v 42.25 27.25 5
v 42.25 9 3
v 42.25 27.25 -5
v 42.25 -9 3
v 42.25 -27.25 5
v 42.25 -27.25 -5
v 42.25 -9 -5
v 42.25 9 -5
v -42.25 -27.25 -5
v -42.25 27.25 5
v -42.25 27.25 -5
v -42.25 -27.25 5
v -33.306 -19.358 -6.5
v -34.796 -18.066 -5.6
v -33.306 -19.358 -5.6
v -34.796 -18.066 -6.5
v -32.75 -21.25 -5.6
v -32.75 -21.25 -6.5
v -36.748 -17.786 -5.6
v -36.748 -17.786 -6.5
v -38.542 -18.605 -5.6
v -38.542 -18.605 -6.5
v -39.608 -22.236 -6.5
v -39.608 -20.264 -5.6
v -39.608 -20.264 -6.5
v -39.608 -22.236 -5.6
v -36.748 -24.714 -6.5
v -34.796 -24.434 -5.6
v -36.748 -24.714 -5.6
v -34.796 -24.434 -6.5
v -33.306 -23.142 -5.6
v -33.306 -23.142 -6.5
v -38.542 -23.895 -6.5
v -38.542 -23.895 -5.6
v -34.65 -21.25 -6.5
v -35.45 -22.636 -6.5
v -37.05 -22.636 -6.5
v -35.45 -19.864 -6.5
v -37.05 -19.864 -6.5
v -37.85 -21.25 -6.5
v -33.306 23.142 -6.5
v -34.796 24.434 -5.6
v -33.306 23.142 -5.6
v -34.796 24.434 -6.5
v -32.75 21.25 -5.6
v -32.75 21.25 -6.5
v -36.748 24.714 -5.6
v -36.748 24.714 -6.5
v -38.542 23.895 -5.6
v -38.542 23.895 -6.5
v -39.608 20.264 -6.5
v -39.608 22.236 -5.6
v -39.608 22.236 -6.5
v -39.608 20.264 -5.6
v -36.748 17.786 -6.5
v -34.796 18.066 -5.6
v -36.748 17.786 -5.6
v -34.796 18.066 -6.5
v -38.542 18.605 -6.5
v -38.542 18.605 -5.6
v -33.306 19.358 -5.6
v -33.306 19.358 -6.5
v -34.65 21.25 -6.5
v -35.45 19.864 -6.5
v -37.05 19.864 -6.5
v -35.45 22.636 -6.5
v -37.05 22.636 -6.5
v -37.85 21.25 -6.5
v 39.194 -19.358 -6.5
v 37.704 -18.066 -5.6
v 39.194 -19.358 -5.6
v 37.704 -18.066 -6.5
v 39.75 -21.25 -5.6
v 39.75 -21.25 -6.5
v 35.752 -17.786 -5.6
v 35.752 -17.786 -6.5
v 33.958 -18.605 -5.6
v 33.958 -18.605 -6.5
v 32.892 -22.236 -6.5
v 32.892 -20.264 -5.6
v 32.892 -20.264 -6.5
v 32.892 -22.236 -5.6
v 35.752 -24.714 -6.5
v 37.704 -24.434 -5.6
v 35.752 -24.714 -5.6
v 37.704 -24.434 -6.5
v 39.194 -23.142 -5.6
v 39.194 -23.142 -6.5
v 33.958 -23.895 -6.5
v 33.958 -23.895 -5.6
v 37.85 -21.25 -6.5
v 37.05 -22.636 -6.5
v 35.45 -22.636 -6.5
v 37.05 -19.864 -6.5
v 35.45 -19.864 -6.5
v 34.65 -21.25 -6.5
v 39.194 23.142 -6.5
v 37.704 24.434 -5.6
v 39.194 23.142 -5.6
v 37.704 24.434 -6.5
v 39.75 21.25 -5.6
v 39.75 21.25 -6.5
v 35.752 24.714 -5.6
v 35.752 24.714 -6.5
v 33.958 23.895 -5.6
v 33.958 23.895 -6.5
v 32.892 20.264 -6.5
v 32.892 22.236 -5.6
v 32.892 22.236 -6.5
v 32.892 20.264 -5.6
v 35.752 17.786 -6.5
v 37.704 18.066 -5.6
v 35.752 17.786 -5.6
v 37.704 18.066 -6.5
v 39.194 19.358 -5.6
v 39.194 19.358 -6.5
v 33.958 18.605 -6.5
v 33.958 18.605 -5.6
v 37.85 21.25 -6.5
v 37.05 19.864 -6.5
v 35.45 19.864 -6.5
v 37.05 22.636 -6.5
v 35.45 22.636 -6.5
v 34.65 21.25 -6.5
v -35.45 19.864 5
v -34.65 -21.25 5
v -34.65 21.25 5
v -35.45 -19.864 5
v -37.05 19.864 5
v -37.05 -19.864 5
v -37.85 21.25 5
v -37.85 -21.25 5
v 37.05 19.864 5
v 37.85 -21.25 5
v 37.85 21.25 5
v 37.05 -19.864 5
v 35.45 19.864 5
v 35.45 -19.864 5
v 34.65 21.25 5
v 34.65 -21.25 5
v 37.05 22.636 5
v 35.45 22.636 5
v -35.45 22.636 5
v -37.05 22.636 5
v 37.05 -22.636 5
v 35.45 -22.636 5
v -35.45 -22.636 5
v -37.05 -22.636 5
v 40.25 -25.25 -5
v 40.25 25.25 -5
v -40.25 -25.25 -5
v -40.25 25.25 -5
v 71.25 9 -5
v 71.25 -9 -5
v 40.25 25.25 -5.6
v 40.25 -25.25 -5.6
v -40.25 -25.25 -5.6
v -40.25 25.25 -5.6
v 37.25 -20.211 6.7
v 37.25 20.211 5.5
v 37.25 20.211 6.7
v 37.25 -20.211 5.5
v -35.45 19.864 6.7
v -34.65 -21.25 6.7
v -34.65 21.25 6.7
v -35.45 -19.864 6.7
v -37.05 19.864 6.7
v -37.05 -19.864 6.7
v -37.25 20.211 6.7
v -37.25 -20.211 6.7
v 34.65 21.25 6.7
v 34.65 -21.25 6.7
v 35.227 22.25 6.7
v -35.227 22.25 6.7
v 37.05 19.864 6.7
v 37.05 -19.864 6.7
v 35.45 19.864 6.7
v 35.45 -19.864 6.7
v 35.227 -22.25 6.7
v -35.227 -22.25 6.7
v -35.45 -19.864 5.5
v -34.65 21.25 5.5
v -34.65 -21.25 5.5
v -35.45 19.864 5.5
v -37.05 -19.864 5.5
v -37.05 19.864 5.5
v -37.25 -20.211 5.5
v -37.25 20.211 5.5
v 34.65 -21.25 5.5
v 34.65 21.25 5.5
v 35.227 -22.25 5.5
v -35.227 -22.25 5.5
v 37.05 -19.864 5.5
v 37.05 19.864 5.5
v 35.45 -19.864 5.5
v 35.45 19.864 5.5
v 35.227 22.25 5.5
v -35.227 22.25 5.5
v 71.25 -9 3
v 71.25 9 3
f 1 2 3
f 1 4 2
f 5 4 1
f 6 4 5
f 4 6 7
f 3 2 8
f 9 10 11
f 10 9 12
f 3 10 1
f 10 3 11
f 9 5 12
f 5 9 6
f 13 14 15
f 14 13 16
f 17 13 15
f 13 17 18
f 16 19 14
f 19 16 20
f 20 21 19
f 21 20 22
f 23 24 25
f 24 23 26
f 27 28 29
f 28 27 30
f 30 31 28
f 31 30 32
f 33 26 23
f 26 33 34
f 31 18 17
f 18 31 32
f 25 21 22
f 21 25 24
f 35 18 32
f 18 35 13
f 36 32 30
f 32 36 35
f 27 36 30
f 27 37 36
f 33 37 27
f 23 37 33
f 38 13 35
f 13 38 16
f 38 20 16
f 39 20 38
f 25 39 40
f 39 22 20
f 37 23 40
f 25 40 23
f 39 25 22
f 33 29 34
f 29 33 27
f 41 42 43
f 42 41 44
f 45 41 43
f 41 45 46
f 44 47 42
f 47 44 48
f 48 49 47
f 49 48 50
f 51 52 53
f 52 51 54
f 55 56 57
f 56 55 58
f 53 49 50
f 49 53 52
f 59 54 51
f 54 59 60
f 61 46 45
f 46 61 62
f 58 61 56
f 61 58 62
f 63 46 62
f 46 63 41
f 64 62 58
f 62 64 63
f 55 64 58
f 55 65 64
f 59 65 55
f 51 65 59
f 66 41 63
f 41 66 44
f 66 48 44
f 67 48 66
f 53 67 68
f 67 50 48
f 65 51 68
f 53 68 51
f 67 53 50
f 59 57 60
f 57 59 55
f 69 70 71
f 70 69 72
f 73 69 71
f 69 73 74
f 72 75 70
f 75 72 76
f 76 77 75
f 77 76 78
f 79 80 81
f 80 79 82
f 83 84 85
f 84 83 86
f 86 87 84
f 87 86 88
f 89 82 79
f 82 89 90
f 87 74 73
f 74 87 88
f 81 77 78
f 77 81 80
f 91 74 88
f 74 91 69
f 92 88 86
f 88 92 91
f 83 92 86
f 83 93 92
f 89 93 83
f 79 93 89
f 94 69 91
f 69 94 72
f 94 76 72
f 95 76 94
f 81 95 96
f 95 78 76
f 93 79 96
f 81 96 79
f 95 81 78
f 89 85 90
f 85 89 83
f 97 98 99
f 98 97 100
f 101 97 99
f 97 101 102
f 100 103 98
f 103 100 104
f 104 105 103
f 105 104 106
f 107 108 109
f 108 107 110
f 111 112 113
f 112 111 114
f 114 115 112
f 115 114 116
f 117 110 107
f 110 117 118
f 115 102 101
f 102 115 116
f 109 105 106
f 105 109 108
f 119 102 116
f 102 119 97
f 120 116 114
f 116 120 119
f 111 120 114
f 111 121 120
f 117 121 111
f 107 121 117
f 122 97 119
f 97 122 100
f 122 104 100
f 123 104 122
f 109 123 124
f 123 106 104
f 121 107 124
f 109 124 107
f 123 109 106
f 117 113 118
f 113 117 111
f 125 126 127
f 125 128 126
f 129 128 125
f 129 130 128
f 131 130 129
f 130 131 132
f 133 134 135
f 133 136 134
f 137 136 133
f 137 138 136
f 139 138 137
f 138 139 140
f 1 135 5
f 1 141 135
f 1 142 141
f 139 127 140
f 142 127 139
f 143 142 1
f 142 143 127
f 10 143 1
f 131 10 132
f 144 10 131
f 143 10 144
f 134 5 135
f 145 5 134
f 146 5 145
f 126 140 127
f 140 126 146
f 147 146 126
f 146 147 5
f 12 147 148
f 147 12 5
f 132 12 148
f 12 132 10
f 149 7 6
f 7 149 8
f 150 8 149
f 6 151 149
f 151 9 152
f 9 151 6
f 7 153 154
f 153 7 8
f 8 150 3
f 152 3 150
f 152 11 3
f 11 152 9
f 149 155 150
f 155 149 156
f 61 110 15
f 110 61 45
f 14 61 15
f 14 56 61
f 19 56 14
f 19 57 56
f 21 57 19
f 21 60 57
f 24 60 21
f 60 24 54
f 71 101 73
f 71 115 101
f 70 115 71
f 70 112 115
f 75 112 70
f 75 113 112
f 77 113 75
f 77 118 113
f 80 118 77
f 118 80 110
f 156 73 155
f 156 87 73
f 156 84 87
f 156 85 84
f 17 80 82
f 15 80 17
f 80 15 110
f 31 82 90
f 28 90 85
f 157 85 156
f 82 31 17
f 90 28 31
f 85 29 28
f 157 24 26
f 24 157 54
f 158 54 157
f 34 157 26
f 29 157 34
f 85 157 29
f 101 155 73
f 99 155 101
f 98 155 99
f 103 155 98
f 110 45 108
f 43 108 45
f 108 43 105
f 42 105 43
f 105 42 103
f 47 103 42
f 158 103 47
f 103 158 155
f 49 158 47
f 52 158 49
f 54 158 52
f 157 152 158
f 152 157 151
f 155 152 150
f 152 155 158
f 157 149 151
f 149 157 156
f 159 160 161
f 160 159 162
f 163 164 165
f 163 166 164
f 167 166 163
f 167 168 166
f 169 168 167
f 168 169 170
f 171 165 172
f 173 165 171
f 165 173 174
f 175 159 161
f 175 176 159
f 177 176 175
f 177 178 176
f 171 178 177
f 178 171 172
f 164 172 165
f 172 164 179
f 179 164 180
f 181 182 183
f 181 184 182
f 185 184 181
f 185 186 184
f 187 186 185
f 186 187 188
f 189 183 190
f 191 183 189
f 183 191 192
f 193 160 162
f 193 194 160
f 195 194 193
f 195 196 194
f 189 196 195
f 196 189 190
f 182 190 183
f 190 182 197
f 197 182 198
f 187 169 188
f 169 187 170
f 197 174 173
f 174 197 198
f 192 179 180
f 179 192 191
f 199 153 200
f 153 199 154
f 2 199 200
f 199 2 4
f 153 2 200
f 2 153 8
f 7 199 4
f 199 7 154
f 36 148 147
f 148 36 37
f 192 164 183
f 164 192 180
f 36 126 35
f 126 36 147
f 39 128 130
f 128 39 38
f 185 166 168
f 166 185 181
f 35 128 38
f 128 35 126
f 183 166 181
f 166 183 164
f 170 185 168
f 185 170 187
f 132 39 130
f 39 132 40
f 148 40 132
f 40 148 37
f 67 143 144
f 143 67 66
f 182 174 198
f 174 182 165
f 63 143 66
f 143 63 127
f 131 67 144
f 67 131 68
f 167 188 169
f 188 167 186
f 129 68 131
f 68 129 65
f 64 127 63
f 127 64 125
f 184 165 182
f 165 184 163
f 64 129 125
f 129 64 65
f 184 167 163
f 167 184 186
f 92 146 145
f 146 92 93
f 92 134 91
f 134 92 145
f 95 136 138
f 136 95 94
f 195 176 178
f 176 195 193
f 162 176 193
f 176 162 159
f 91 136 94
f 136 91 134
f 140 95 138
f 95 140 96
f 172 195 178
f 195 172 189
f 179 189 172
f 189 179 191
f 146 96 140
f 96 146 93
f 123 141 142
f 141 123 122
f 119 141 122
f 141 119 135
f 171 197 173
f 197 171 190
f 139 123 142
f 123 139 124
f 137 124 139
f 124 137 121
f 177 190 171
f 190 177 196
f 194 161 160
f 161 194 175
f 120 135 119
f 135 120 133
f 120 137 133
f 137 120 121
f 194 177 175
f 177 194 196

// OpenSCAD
// Parameters
width_mm = 84.5; //[42.25:169:0.1]
height_mm = 54.5; //[27.25:109:0.1]
thickness_mm = 10; //[5:20:0.1]
bezel_thickness_mm = 2.5; //[1:6:0.1]
bezel_frame_mm = 4; //[2:10:0.1]
aperture_width_mm = 76.5; //[38.25:153:0.1]
aperture_height_mm = 46.5; //[23.25:93:0.1]
aperture_offset_x_mm = 0; //[-10:10:0.1]
aperture_offset_y_mm = 0; //[-10:10:0.1]
pcb_thickness_mm = 1.6; //[0.8:3.2:0.1]
pcb_margin_mm = 2; //[0:6:0.1]
mount_hole_diameter_mm = 3.2; //[2:6.5:0.1]
mount_hole_edge_offset_x_mm = 6; //[3:15:0.1]
mount_hole_edge_offset_y_mm = 6; //[3:15:0.1]
mount_hole_placeholder_height_mm = 2.5; //[1:6:0.1]
mount_hole_boss_diameter_mm = 7; //[5:14:0.1]
display_glass_thickness_mm = 1.2; //[0.5:3:0.1]
display_recess_mm = 0.8; //[0:3:0.1]
mod_width_mm = 30; //[15:60:0.1]
mod_height_mm = 18; //[9:36:0.1]
mod_thickness_mm = 8; //[4:16:0.1]
overlap_mm = 1; //[0.5:2:0.1]

// Display module - complete geometry
module display() {
  color([0.0, 0.4, 0.2]) { // PCB green
    // Display module body
    cube([width_mm, height_mm, thickness_mm], center=true);
    
    // Front bezel face
    difference() {
      cube([width_mm, height_mm, bezel_thickness_mm], center=true);
      translate([aperture_offset_x_mm, aperture_offset_y_mm, 0])
        cube([aperture_width_mm, aperture_height_mm, bezel_thickness_mm + overlap_mm*2], center=true);
    }
    
    // Rear PCB plate
    translate([0, 0, -thickness_mm/2 - pcb_thickness_mm/2 + overlap_mm])
      cube([width_mm - 2*pcb_margin_mm, height_mm - 2*pcb_margin_mm, pcb_thickness_mm], center=true);
    
    // Mounting hole bosses
    for (x = [-1, 1], y = [-1, 1]) {
      translate([x * (width_mm/2 - mount_hole_edge_offset_x_mm), y * (height_mm/2 - mount_hole_edge_offset_y_mm), -thickness_mm/2 - mount_hole_placeholder_height_mm/2 + overlap_mm])
        cylinder(r=mount_hole_boss_diameter_mm/2, h=mount_hole_placeholder_height_mm, center=true);
    }
    
    // Display glass
    translate([aperture_offset_x_mm, aperture_offset_y_mm, thickness_mm/2 + bezel_thickness_mm - display_recess_mm - display_glass_thickness_mm/2])
      cube([aperture_width_mm - 2*overlap_mm, aperture_height_mm - 2*overlap_mm, display_glass_thickness_mm], center=true);
  }
}

// Mod - complete geometry
module mod() {
  color([0.1, 0.1, 0.6]) { // Blue
    translate([width_mm/2 + mod_width_mm/2 - overlap_mm, 0, -thickness_mm/2 + mod_thickness_mm/2])
      cube([mod_width_mm, mod_height_mm, mod_thickness_mm], center=true);
  }
}

// Assembly
module assembly() {
  difference() {
    union() {
      display();
      mod();
    }
    // Mounting holes
    for (x = [-1, 1], y = [-1, 1]) {
      translate([x * (width_mm/2 - mount_hole_edge_offset_x_mm), y * (height_mm/2 - mount_hole_edge_offset_y_mm), 0])
        cylinder(r=mount_hole_diameter_mm/2, h=thickness_mm + bezel_thickness_mm + pcb_thickness_mm + mount_hole_placeholder_height_mm + overlap_mm*4, center=true);
    }
  }
}

assembly();
